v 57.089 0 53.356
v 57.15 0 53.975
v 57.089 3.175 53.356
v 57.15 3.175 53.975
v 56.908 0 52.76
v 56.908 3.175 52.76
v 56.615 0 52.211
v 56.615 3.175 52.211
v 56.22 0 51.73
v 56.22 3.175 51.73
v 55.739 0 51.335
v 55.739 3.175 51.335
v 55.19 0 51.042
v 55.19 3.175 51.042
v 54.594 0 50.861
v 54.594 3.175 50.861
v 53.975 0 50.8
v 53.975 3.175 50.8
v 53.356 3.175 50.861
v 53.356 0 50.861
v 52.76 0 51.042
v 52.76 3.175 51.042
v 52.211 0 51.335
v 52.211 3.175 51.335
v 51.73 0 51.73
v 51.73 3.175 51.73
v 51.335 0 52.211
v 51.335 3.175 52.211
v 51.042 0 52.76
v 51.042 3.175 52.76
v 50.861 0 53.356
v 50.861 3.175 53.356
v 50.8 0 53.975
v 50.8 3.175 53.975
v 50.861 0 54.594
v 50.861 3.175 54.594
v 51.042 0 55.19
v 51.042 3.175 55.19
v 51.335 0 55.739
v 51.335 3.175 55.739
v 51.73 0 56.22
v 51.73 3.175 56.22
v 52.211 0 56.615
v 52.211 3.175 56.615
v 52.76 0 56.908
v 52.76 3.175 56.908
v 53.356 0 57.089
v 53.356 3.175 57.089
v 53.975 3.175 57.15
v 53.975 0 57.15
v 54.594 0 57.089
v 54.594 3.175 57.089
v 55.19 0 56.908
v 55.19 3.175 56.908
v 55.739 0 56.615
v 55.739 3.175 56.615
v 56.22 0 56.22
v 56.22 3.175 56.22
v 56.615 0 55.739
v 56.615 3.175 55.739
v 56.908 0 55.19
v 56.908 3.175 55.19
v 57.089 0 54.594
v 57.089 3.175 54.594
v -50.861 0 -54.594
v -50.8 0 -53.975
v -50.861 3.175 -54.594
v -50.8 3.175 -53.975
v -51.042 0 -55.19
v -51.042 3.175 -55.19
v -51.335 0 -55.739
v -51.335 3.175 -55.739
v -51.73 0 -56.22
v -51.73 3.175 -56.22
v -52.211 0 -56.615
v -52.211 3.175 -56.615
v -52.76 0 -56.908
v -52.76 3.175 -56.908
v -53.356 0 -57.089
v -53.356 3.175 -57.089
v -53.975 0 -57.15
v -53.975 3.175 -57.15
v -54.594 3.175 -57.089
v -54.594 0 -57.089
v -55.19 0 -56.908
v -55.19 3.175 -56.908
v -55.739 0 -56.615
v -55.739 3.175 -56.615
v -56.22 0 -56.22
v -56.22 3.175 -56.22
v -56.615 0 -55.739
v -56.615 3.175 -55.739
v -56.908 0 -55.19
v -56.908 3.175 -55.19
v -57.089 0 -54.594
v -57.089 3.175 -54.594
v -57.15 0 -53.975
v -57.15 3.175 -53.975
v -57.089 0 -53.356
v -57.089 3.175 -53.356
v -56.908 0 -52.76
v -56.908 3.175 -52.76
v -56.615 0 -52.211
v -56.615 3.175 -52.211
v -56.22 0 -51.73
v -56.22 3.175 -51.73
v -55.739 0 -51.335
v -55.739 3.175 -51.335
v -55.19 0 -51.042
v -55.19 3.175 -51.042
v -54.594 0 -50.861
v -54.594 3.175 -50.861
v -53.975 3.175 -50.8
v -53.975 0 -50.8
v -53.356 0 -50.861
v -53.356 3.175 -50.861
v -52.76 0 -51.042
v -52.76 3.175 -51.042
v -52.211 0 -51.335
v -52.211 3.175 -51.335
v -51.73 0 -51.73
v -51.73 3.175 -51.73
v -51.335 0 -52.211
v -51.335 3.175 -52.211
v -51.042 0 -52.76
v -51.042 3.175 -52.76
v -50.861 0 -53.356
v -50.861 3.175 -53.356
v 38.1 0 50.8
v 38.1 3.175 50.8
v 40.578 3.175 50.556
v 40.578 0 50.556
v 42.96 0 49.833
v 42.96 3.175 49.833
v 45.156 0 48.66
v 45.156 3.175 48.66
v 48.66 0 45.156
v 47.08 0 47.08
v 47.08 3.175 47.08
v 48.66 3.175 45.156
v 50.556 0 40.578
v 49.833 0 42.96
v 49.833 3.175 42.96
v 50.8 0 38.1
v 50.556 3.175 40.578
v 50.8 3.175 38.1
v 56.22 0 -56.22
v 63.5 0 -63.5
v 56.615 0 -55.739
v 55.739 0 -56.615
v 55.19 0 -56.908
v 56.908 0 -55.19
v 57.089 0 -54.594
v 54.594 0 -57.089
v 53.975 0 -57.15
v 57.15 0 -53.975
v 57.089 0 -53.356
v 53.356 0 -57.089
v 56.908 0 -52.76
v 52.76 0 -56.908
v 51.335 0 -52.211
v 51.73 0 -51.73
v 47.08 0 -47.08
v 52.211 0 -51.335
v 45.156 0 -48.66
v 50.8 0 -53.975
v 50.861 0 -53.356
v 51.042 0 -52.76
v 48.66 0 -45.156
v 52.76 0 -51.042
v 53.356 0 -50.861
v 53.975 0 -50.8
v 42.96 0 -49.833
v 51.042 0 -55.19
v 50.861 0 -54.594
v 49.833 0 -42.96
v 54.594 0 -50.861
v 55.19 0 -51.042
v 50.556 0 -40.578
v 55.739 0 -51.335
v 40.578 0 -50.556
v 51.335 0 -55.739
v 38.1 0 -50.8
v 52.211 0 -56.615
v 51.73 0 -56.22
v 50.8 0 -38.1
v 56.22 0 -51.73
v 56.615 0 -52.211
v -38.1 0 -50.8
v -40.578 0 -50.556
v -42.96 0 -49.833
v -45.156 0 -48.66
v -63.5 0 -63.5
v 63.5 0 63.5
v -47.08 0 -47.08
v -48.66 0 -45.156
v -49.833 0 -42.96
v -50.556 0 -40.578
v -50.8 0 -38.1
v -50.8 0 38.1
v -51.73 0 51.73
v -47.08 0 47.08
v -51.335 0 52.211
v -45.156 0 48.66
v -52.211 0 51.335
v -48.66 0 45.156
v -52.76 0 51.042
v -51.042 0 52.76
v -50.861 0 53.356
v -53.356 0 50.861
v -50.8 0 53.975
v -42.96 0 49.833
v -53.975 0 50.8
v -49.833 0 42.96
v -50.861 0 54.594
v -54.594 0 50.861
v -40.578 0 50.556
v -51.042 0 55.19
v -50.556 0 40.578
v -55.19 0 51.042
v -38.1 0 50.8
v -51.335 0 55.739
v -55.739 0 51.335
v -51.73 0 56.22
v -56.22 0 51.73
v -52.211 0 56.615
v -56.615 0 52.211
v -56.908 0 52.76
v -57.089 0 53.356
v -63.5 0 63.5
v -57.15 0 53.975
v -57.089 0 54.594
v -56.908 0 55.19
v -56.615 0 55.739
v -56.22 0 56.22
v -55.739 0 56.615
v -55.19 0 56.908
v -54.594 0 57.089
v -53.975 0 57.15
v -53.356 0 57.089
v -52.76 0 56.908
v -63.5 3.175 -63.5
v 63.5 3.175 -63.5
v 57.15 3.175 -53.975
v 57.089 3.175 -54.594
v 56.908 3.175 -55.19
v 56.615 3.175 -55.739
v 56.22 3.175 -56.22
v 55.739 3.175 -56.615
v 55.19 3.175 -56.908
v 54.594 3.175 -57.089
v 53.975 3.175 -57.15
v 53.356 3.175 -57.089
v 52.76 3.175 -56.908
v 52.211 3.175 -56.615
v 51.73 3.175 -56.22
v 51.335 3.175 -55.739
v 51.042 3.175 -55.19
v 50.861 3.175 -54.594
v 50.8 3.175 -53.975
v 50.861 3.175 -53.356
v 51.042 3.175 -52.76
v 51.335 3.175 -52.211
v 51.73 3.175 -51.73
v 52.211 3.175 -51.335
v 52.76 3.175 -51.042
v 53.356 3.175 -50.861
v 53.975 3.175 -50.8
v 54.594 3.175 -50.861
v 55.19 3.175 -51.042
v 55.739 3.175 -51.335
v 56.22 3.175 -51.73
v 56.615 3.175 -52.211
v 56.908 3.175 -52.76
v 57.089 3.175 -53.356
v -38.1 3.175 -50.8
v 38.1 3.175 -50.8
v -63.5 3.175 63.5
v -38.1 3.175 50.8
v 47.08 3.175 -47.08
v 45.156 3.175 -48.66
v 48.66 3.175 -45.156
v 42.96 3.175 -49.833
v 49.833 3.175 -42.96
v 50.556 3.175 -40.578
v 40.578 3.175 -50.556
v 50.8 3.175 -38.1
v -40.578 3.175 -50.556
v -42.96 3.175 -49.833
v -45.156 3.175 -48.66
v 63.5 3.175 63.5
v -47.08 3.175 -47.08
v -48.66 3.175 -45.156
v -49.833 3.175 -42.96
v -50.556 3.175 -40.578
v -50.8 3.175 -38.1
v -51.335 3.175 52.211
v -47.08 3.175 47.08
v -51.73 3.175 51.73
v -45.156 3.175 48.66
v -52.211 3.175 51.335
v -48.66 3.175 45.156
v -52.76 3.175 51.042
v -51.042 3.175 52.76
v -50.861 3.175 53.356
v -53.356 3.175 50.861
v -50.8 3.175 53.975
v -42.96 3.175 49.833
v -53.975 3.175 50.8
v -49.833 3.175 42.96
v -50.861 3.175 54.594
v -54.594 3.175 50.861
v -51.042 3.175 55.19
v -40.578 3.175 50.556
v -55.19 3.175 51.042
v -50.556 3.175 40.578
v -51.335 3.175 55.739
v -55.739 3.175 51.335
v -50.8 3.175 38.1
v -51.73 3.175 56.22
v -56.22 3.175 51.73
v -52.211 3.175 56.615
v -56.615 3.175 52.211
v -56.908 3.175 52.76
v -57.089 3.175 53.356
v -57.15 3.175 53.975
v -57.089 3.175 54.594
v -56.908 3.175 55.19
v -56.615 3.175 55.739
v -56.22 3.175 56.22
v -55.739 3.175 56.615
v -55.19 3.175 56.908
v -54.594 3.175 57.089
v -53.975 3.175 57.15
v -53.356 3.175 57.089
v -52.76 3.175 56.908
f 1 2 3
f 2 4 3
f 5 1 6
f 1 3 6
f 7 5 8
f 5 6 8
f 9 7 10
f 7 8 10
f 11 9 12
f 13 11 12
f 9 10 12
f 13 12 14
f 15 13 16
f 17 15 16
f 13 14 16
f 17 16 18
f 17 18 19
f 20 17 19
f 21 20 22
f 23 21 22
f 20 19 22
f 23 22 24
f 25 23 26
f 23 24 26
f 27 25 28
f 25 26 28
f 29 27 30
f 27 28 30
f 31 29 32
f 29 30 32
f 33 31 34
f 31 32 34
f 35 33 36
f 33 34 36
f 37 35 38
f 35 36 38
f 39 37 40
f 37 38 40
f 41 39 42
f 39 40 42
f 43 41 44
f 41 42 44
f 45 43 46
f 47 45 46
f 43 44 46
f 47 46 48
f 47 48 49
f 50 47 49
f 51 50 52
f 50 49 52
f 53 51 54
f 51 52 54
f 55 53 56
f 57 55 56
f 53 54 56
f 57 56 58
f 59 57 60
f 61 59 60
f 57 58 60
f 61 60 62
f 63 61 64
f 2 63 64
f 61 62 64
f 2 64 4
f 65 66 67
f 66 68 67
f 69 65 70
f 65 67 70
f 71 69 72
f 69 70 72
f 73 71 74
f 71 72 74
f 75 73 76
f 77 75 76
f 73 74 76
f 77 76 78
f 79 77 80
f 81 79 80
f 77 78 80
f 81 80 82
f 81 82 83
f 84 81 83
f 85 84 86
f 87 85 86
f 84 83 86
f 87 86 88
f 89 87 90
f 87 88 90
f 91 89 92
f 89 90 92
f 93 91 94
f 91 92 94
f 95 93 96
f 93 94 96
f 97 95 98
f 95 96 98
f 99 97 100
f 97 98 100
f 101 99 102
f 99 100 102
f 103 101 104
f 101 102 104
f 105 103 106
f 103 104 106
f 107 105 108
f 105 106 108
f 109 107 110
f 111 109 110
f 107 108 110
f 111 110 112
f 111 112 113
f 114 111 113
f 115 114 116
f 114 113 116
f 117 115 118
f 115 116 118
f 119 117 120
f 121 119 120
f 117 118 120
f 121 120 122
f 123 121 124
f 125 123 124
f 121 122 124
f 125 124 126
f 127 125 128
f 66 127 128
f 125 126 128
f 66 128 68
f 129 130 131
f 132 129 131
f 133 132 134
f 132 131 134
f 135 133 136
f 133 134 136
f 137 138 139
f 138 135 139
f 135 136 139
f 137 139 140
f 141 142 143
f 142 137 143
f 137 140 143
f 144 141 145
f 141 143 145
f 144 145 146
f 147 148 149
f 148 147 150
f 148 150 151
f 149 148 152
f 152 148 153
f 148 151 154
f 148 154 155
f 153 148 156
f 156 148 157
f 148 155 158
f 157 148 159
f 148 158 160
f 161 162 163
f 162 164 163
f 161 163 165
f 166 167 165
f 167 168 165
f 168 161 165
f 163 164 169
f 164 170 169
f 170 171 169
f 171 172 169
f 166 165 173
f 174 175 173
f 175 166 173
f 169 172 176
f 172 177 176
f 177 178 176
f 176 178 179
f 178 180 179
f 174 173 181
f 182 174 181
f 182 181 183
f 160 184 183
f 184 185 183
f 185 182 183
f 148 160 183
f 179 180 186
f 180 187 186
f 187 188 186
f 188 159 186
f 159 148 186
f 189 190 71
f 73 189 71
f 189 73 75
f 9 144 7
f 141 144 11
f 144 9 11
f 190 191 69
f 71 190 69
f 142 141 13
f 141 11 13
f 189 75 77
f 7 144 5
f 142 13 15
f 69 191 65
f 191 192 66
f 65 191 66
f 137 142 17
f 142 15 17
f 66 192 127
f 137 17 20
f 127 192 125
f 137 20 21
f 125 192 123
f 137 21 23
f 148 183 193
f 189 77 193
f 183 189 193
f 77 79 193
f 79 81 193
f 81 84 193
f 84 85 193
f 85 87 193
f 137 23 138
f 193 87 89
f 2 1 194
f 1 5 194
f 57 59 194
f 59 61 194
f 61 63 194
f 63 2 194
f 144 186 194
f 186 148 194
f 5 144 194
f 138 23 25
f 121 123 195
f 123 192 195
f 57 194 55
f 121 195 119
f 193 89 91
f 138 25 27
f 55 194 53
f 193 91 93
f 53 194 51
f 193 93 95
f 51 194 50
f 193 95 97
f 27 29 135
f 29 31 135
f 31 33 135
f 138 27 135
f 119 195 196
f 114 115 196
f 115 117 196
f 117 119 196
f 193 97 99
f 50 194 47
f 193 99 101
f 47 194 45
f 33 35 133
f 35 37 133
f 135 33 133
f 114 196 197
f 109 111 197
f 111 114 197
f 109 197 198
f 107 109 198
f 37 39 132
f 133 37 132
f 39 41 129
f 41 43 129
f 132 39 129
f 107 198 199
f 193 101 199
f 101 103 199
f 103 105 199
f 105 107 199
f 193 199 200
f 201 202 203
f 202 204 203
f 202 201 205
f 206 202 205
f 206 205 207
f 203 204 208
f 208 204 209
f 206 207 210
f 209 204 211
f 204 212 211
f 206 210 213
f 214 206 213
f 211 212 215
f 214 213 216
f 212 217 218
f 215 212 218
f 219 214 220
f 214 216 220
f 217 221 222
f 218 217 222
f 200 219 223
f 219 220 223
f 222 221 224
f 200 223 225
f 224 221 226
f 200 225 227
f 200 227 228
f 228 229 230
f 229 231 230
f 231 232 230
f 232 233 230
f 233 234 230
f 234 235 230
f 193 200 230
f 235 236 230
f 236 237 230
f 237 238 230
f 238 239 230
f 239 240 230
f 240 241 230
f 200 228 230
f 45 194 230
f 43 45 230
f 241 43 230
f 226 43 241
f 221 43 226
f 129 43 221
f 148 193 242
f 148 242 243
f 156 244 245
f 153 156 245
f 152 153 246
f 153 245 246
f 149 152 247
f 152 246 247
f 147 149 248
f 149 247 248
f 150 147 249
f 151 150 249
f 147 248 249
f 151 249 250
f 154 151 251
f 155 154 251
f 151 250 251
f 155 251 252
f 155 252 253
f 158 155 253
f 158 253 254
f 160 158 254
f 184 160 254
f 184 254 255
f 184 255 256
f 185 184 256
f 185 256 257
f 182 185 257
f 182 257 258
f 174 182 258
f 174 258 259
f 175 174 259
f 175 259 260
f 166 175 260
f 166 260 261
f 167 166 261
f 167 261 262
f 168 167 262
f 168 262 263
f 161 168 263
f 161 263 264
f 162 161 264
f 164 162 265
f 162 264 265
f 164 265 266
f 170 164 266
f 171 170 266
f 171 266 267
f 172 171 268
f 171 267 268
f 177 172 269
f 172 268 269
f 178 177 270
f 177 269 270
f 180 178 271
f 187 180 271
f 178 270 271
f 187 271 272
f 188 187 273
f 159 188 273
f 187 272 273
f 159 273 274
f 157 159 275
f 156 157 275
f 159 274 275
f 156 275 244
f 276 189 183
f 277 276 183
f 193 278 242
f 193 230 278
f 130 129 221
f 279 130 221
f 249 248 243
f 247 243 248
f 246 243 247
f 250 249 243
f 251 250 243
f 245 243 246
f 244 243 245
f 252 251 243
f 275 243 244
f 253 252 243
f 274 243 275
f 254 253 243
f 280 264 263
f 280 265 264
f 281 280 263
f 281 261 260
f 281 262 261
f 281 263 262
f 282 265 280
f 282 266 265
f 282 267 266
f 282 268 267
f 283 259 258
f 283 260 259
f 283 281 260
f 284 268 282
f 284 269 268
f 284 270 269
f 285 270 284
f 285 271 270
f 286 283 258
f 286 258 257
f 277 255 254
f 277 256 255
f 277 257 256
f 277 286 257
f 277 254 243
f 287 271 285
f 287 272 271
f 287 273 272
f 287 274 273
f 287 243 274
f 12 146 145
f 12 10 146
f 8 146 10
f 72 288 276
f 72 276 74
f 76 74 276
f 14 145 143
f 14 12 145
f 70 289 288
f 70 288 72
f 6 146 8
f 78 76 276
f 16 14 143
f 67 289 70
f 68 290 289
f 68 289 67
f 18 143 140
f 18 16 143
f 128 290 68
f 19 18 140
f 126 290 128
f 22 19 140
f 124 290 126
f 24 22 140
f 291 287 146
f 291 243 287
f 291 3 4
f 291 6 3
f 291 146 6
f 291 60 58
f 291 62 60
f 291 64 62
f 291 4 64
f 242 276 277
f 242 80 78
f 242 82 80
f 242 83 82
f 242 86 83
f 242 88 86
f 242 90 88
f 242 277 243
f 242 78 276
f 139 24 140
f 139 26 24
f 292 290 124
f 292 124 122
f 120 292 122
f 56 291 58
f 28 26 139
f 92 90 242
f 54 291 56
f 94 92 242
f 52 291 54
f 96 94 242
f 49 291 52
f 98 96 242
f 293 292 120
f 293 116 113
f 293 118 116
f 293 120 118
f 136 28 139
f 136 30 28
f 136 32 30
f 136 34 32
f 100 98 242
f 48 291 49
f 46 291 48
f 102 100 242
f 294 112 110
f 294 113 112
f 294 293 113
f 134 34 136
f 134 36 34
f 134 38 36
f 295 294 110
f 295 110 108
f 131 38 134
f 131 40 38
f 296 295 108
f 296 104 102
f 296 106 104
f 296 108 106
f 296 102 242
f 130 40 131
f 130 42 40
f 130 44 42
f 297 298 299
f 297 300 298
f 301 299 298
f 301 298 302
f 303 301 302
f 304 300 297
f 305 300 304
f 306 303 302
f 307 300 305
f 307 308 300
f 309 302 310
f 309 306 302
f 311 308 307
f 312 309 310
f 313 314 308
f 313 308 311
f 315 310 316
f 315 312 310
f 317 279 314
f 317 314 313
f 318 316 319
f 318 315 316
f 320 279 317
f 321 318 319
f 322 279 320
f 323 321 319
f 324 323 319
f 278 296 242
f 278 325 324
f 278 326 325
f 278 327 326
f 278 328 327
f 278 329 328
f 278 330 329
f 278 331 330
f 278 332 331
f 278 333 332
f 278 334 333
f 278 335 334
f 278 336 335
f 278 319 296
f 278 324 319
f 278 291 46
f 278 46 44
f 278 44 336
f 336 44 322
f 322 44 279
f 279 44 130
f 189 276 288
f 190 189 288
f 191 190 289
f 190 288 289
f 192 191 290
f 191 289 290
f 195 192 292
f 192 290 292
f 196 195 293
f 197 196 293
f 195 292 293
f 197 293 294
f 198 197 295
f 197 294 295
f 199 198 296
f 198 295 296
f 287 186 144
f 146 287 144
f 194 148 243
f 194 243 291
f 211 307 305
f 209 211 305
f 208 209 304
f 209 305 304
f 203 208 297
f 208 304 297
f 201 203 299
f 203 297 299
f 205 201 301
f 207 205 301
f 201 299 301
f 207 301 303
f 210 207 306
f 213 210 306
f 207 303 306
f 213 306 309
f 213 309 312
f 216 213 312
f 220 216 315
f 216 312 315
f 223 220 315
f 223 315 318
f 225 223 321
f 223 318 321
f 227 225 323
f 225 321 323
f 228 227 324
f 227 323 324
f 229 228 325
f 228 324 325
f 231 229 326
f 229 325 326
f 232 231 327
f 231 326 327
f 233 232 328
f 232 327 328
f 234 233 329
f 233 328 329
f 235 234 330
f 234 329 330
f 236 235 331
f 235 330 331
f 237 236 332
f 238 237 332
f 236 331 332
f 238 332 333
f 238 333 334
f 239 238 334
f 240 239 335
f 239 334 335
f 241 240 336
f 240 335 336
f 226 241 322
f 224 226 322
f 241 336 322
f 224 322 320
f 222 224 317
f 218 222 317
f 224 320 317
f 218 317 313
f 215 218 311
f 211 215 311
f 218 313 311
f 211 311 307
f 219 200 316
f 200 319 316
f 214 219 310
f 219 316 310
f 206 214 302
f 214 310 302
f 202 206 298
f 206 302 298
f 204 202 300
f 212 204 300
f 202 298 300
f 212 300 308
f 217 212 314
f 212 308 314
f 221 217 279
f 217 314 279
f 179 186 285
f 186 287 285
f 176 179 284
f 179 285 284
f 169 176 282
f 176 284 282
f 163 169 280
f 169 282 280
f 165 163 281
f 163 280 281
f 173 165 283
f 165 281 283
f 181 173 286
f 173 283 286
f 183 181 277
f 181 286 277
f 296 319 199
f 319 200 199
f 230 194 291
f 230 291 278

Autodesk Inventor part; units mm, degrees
ref_plane "YZ Plane" through (0, 0, 0) normal (1, 0, 0) x (0, 1, 0)
ref_plane "XZ Plane" through (0, 0, 0) normal (0, 1, 0) x (-1, 0, 0)
ref_plane "XY Plane" through (0, 0, 0) normal (0, 0, 1) x (1, 0, 0)
sketch "Sketch1" plane through (0, 0, 0) normal (0, 1, 0) x (-1, 0, 0)
  line L0 (-63.5, 63.5) -> (63.5, 63.5)
  line L1 (63.5, 63.5) -> (63.5, -63.5)
  line L2 (63.5, -63.5) -> (-63.5, -63.5)
  line L3 (-63.5, -63.5) -> (-63.5, 63.5)
  line L4 (-50.8, 50.8) -> (50.8, 50.8)
  line L5 (50.8, 50.8) -> (50.8, -50.8)
  line L6 (50.8, -50.8) -> (-50.8, -50.8)
  line L7 (-50.8, -50.8) -> (-50.8, 50.8)
  point P0 (0, 0)
  dimension "d0" = 127
  dimension "d1" = 127
  dimension "d2" = 63.5
  dimension "d3" = 63.5
  dimension "d4" = 50.8
  dimension "d5" = 50.8
  dimension "d6" = 101.6
  dimension "d7" = 101.6
extrude "Extrusion1" add sketch "Sketch1" along normal blind 3.175
fillet "Fillet1" radius 12.7 4 edges at (-50.8, 1.5875, -50.8) (-50.8, 1.5875, 50.8) (50.8, 1.5875, -50.8) (50.8, 1.5875, 50.8)
sketch "Sketch2" plane through (0, 3.175, 0) normal (0, 1, 0) x (1, 0, 0)
  line L0 (63.5, 63.5) -> (-63.5, 63.5) projected
  line L1 (-63.5, 63.5) -> (-63.5, -63.5) projected
  circle A0 centre (-53.975, 53.975) radius 3.175
  circle A1 centre (53.975, 53.975) radius 3.175
  circle A2 centre (-53.975, -53.975) radius 3.175
  circle A3 centre (53.975, -53.975) radius 3.175
  point P0 (0, 0)
  dimension "d11" = 6.35
  dimension "d12" = 9.525
  dimension "d13" = 9.525
  dimension "d16" = 107.95
  dimension "d19" = 107.95
extrude "Extrusion2" cut sketch "Sketch2" against normal blind 3.175
properties part number "case1_space"
